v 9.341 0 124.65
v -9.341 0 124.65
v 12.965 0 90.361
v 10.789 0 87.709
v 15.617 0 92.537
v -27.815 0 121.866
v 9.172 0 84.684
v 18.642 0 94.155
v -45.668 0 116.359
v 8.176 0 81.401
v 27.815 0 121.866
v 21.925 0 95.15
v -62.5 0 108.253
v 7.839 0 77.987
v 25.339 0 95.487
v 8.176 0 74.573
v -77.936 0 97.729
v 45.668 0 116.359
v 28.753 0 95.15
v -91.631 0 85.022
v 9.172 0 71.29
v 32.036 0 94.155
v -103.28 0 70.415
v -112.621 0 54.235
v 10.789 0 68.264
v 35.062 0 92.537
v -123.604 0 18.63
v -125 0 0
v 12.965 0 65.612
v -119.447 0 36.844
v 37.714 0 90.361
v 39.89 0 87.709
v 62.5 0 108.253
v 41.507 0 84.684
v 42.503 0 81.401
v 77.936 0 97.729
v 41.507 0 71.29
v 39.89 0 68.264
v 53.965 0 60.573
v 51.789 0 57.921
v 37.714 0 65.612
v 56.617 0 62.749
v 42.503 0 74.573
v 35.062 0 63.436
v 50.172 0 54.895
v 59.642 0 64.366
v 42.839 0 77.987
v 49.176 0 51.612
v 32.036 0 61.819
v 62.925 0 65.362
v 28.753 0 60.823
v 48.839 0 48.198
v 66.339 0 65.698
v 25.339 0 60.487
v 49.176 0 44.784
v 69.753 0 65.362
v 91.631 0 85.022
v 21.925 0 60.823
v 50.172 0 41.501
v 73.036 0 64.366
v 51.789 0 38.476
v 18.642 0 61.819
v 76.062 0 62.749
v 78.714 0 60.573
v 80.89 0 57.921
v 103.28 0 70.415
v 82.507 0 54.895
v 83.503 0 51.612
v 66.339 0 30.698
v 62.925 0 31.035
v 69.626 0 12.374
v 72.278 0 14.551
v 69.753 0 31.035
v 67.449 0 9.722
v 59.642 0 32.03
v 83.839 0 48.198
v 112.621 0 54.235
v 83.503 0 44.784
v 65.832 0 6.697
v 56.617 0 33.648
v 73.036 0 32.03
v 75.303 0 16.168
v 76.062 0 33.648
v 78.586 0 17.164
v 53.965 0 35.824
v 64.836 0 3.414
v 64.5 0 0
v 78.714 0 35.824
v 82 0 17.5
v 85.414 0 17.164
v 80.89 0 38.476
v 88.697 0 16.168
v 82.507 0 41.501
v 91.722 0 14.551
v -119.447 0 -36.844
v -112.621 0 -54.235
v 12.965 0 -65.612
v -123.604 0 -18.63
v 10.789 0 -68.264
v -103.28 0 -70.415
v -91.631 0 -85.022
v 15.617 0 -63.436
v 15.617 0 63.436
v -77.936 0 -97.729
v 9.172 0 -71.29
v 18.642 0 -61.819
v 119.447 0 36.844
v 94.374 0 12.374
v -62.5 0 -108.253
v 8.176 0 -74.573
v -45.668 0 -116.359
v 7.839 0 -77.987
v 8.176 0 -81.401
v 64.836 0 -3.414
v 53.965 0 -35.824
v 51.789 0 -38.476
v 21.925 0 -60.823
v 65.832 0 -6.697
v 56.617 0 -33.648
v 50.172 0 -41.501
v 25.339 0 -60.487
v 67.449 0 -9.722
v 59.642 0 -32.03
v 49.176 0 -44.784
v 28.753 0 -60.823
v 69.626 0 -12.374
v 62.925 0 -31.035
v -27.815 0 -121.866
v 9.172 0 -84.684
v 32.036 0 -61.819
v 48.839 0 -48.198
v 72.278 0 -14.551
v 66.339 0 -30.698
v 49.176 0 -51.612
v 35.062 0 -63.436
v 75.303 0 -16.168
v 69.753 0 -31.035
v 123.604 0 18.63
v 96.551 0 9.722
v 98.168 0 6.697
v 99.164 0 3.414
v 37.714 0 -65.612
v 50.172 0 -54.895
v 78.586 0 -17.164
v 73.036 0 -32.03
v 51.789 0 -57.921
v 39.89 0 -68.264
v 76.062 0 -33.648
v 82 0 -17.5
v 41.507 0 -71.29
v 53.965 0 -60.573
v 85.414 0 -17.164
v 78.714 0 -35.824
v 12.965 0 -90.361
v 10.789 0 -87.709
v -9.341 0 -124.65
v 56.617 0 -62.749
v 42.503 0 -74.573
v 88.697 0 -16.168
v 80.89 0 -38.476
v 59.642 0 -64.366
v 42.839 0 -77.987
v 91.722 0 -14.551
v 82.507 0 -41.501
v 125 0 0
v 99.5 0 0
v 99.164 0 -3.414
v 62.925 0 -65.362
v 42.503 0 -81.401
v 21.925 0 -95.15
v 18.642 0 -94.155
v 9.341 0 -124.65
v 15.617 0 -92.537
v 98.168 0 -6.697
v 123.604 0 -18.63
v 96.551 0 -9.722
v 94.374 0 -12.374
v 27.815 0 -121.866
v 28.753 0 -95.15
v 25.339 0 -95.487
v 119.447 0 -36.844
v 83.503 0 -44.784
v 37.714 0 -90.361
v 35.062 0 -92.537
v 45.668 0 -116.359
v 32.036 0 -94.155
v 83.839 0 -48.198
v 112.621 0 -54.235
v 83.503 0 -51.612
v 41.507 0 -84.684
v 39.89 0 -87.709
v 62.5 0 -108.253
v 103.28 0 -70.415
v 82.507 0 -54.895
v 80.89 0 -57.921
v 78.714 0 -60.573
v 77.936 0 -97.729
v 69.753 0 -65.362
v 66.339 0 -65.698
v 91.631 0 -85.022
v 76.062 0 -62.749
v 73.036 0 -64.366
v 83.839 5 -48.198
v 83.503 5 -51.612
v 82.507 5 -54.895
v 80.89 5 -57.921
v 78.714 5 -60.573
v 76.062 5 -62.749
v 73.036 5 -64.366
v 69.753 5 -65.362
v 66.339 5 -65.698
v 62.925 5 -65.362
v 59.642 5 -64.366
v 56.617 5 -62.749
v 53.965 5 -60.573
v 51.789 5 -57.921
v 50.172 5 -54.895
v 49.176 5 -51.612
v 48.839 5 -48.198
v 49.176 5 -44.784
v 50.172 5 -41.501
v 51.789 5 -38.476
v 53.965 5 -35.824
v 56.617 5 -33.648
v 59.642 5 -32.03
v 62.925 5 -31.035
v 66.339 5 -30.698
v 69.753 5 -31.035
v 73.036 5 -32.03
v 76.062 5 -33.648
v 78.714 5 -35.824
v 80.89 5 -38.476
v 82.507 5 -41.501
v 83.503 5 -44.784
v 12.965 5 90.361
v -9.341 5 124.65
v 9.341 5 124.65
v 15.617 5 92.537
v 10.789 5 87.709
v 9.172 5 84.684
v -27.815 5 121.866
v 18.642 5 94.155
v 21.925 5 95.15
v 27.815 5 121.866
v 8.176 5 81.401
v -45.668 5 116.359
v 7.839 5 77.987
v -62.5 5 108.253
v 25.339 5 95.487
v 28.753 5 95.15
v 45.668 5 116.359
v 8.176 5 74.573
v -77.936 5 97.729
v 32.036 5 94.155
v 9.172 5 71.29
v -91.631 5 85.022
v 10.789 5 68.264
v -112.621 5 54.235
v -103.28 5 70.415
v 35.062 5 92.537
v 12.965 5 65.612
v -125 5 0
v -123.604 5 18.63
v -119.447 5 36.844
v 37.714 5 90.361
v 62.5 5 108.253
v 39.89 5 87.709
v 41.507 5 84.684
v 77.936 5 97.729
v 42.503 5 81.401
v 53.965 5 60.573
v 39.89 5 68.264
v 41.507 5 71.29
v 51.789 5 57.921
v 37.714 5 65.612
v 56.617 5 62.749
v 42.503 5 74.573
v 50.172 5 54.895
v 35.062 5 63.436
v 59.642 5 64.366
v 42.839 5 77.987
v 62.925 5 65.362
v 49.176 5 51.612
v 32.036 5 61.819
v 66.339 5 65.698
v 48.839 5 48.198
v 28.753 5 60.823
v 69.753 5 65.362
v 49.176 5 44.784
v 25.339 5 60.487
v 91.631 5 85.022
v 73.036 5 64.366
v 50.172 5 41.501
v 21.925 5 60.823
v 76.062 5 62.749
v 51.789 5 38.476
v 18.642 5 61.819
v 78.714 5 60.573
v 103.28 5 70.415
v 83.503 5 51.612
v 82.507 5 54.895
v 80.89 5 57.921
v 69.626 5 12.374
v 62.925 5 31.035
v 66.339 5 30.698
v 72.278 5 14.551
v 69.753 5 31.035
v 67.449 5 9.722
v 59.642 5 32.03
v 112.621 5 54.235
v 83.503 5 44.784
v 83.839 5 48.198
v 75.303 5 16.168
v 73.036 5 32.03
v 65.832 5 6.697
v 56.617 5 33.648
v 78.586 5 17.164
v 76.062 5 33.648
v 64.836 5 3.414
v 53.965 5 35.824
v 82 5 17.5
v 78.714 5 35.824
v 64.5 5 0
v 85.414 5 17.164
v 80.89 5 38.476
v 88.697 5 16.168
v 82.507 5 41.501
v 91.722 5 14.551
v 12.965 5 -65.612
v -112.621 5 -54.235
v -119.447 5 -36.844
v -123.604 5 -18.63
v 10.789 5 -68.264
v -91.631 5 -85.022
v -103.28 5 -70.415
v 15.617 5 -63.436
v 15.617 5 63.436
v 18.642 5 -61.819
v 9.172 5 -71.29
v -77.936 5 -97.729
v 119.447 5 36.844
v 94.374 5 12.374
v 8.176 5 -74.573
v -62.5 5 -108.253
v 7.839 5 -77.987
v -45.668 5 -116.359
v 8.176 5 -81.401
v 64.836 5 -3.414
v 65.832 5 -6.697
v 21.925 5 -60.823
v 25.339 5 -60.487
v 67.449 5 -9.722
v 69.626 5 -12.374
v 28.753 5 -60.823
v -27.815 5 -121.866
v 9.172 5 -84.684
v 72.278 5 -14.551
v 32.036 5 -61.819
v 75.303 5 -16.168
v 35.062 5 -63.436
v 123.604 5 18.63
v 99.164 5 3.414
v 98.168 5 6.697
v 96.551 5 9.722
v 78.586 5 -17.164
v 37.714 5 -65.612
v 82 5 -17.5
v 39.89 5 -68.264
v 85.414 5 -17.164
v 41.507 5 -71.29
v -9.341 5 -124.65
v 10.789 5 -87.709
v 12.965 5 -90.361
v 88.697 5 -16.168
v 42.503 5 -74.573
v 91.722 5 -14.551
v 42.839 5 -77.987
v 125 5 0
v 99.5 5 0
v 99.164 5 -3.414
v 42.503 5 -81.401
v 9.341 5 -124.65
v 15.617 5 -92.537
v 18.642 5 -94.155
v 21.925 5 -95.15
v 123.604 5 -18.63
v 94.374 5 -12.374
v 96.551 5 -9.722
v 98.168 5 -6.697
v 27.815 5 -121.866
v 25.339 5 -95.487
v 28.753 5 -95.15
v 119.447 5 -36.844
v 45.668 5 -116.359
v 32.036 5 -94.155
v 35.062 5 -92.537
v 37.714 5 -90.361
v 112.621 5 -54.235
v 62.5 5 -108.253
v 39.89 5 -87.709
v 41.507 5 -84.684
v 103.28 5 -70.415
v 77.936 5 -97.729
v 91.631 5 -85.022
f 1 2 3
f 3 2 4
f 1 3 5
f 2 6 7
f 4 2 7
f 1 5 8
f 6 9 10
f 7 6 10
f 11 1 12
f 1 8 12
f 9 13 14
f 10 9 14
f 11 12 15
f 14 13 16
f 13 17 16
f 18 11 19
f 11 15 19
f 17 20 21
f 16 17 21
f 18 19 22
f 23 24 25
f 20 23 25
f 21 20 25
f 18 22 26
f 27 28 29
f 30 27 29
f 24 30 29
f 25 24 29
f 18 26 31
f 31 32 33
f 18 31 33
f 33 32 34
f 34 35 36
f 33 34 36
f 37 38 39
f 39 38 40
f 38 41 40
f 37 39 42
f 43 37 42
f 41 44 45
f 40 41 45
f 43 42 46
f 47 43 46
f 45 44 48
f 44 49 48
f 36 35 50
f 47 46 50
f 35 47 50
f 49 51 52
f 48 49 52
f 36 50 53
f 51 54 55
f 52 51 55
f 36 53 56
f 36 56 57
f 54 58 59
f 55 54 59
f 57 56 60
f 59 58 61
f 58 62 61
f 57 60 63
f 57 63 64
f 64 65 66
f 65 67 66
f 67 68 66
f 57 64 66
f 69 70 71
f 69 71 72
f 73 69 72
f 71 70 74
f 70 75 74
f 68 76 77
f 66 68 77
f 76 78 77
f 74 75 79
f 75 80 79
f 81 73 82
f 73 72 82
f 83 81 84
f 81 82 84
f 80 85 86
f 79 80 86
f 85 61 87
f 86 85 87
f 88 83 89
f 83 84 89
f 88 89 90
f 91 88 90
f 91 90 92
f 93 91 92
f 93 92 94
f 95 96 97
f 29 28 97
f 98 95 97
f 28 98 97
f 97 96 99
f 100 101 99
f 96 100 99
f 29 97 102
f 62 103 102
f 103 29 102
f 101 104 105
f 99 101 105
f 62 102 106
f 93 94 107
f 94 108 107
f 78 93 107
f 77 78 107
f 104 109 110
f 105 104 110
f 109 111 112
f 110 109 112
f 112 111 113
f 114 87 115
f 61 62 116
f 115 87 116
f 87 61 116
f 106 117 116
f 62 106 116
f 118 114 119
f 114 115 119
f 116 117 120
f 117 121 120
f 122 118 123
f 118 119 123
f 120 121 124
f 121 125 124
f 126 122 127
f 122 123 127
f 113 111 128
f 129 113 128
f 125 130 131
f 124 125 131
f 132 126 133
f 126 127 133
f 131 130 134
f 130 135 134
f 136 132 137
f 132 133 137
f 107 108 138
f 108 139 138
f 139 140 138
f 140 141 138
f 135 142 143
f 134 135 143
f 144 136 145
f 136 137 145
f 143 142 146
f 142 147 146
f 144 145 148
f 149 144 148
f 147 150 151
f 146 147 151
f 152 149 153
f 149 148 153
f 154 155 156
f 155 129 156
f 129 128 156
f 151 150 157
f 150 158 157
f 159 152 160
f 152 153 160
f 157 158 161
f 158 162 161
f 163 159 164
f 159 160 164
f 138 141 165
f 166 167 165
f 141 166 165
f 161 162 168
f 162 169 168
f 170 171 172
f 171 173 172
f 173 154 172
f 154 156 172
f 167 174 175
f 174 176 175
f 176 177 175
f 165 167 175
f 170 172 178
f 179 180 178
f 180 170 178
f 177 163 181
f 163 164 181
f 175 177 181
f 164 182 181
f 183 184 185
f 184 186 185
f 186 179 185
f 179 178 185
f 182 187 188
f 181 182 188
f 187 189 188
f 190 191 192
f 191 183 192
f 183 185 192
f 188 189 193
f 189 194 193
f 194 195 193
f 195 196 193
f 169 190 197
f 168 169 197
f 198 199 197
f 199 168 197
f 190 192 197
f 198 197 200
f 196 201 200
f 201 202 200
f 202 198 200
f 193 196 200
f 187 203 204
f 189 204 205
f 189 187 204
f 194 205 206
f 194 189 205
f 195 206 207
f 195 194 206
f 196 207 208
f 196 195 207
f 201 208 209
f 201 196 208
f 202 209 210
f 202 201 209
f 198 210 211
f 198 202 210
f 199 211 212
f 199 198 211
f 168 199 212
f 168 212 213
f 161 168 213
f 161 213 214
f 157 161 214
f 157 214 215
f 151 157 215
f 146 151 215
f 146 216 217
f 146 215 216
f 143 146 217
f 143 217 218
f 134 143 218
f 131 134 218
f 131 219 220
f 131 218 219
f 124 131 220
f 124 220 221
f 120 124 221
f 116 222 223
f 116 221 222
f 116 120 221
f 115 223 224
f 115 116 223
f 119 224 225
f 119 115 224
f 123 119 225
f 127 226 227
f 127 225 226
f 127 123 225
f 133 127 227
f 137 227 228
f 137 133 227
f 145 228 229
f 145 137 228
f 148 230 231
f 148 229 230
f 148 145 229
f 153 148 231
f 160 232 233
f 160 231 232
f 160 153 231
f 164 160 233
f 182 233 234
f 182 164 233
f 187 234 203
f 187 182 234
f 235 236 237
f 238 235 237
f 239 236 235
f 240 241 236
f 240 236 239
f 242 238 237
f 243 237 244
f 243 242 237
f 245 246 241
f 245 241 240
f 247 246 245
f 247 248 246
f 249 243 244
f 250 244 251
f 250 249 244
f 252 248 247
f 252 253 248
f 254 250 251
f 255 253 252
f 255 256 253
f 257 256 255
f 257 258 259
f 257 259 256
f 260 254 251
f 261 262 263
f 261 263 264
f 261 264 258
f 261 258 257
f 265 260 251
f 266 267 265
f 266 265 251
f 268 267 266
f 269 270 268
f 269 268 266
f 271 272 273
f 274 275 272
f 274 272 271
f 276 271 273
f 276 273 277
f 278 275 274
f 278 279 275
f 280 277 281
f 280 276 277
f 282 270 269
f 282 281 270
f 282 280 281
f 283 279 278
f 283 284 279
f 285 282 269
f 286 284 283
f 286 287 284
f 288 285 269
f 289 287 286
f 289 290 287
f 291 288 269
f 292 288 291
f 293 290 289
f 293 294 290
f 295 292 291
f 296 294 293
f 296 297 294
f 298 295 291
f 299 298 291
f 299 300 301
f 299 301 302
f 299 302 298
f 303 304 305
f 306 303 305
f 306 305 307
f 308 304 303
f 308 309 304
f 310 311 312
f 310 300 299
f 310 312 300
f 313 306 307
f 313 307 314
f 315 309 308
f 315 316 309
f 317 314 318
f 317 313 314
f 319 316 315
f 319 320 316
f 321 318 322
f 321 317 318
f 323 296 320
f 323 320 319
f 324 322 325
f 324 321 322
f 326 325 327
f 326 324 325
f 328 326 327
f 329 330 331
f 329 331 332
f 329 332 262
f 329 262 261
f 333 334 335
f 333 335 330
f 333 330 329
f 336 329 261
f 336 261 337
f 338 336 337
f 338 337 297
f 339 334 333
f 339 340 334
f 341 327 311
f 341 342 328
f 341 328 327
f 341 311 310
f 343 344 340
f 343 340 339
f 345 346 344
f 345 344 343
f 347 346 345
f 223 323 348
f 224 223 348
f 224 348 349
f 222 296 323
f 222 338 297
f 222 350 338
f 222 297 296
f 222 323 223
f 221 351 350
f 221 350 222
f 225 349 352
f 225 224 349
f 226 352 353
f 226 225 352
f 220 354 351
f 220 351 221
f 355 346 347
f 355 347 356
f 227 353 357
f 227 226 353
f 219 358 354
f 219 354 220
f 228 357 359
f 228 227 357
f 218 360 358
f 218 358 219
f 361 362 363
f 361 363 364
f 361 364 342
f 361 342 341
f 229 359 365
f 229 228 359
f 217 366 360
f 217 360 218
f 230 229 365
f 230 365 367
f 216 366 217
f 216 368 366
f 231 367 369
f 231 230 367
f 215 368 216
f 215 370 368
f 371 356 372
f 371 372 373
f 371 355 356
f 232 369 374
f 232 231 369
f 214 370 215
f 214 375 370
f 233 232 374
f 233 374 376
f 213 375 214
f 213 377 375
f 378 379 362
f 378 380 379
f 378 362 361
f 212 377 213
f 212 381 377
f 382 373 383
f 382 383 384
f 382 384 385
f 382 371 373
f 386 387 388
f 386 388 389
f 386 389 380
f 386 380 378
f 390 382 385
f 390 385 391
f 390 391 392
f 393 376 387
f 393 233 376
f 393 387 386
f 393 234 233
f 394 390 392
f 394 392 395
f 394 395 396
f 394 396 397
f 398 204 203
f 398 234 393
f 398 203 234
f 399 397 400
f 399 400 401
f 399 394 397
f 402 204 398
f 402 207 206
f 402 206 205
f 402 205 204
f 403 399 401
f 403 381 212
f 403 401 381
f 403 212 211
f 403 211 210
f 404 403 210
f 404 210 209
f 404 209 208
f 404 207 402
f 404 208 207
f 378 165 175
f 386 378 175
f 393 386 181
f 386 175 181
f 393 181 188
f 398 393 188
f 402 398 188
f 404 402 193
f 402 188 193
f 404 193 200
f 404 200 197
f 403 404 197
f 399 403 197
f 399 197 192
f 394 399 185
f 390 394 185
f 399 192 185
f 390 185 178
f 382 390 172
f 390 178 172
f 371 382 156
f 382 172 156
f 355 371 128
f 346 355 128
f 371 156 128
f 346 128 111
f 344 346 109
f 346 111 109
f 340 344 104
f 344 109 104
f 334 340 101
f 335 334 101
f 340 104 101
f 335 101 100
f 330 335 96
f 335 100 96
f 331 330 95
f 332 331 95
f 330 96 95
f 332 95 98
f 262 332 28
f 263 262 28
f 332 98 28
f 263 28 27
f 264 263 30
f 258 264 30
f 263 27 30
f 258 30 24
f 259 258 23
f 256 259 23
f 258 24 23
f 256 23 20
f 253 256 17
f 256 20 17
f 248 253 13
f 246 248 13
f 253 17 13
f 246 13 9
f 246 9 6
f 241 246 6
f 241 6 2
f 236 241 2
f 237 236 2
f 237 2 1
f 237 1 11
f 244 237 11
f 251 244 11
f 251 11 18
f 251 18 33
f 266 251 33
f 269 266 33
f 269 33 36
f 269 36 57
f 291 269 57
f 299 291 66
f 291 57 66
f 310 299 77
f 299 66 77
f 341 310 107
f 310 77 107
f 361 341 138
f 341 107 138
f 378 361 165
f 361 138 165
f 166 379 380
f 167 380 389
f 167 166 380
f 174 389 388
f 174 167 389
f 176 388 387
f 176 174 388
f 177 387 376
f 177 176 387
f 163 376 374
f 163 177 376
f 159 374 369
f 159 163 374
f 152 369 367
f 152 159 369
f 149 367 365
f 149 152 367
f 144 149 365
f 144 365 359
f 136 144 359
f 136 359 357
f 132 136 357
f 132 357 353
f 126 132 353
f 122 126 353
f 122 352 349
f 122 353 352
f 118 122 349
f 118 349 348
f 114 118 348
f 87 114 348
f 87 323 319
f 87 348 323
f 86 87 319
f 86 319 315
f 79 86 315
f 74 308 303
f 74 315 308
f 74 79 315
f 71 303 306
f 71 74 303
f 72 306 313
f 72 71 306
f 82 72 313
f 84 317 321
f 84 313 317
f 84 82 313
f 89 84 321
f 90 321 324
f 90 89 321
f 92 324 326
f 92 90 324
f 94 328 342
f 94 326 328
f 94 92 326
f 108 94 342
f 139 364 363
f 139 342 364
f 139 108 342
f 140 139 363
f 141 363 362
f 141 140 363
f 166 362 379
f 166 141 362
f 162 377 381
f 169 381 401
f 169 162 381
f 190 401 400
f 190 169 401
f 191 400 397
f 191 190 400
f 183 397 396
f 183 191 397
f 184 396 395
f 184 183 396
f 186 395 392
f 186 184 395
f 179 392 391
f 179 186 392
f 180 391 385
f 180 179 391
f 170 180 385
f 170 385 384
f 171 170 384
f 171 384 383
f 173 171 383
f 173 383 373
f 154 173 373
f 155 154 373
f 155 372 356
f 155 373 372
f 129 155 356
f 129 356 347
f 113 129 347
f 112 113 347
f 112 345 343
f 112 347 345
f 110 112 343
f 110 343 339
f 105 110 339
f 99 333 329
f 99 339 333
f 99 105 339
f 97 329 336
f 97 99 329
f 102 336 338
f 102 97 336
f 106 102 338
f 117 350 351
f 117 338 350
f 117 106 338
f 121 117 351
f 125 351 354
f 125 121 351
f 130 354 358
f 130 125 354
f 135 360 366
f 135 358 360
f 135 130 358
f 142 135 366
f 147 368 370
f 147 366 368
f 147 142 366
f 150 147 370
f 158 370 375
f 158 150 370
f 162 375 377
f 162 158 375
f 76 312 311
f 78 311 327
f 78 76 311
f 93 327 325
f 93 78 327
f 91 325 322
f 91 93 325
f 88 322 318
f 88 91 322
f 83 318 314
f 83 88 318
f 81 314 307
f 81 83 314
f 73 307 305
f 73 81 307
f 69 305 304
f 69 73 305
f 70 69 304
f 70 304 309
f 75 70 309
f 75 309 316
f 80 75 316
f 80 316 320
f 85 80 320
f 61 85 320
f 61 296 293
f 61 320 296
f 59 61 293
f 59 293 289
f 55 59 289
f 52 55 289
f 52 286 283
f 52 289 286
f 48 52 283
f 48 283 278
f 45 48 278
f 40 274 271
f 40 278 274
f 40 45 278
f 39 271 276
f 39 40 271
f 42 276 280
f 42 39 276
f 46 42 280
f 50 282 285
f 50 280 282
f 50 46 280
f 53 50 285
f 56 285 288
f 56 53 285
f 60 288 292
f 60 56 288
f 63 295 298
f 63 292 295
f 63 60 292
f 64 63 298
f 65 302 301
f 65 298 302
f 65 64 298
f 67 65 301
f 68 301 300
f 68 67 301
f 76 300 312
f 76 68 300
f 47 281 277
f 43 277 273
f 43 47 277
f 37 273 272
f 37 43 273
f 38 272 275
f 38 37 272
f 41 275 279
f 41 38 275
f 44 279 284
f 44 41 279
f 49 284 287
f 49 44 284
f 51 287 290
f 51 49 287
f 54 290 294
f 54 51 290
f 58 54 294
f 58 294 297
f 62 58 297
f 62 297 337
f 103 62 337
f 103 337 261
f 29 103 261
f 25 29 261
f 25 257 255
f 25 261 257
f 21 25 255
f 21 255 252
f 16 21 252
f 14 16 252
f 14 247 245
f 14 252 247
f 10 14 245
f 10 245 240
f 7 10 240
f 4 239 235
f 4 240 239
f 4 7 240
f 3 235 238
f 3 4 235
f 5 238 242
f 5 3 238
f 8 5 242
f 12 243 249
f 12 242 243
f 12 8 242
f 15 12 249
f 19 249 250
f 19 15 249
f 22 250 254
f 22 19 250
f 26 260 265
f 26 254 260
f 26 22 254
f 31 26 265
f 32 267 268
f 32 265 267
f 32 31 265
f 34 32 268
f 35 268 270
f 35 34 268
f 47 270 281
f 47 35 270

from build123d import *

# Parameters (mm, degrees)
SKETCH1_R           = 125
BOSS_EXTRUDE1_DEPTH = 5
SKETCH1_5_R         = 17.5
CUT_EXTRUDE4_DEPTH  = 10


with BuildPart() as part:
    # Sketch1 → Boss-Extrude1 (new body)
    with BuildSketch(Plane(origin=(0, 0, 0), x_dir=(1, 0, 0), z_dir=(0, 1, 0))):
        Circle(SKETCH1_R)
    extrude(amount=BOSS_EXTRUDE1_DEPTH)

    # Sketch1<5> → Cut-Extrude4 (cut)
    with BuildSketch(Plane(origin=(0, 0, 0), x_dir=(1, 0, 0), z_dir=(0, 1, 0))):
        with Locations((25.339393539, 77.986634336)):
            Circle(SKETCH1_5_R)
        with Locations((66.339393539, 48.198390688)):
            Circle(SKETCH1_5_R)
        with Locations((82, 0)):
            Circle(SKETCH1_5_R)
        with Locations((66.339393539, -48.198390688)):
            Circle(SKETCH1_5_R)
        with Locations((25.339393539, -77.986634336)):
            Circle(SKETCH1_5_R)
    extrude(amount=CUT_EXTRUDE4_DEPTH, mode=Mode.SUBTRACT)


solid = part.part
